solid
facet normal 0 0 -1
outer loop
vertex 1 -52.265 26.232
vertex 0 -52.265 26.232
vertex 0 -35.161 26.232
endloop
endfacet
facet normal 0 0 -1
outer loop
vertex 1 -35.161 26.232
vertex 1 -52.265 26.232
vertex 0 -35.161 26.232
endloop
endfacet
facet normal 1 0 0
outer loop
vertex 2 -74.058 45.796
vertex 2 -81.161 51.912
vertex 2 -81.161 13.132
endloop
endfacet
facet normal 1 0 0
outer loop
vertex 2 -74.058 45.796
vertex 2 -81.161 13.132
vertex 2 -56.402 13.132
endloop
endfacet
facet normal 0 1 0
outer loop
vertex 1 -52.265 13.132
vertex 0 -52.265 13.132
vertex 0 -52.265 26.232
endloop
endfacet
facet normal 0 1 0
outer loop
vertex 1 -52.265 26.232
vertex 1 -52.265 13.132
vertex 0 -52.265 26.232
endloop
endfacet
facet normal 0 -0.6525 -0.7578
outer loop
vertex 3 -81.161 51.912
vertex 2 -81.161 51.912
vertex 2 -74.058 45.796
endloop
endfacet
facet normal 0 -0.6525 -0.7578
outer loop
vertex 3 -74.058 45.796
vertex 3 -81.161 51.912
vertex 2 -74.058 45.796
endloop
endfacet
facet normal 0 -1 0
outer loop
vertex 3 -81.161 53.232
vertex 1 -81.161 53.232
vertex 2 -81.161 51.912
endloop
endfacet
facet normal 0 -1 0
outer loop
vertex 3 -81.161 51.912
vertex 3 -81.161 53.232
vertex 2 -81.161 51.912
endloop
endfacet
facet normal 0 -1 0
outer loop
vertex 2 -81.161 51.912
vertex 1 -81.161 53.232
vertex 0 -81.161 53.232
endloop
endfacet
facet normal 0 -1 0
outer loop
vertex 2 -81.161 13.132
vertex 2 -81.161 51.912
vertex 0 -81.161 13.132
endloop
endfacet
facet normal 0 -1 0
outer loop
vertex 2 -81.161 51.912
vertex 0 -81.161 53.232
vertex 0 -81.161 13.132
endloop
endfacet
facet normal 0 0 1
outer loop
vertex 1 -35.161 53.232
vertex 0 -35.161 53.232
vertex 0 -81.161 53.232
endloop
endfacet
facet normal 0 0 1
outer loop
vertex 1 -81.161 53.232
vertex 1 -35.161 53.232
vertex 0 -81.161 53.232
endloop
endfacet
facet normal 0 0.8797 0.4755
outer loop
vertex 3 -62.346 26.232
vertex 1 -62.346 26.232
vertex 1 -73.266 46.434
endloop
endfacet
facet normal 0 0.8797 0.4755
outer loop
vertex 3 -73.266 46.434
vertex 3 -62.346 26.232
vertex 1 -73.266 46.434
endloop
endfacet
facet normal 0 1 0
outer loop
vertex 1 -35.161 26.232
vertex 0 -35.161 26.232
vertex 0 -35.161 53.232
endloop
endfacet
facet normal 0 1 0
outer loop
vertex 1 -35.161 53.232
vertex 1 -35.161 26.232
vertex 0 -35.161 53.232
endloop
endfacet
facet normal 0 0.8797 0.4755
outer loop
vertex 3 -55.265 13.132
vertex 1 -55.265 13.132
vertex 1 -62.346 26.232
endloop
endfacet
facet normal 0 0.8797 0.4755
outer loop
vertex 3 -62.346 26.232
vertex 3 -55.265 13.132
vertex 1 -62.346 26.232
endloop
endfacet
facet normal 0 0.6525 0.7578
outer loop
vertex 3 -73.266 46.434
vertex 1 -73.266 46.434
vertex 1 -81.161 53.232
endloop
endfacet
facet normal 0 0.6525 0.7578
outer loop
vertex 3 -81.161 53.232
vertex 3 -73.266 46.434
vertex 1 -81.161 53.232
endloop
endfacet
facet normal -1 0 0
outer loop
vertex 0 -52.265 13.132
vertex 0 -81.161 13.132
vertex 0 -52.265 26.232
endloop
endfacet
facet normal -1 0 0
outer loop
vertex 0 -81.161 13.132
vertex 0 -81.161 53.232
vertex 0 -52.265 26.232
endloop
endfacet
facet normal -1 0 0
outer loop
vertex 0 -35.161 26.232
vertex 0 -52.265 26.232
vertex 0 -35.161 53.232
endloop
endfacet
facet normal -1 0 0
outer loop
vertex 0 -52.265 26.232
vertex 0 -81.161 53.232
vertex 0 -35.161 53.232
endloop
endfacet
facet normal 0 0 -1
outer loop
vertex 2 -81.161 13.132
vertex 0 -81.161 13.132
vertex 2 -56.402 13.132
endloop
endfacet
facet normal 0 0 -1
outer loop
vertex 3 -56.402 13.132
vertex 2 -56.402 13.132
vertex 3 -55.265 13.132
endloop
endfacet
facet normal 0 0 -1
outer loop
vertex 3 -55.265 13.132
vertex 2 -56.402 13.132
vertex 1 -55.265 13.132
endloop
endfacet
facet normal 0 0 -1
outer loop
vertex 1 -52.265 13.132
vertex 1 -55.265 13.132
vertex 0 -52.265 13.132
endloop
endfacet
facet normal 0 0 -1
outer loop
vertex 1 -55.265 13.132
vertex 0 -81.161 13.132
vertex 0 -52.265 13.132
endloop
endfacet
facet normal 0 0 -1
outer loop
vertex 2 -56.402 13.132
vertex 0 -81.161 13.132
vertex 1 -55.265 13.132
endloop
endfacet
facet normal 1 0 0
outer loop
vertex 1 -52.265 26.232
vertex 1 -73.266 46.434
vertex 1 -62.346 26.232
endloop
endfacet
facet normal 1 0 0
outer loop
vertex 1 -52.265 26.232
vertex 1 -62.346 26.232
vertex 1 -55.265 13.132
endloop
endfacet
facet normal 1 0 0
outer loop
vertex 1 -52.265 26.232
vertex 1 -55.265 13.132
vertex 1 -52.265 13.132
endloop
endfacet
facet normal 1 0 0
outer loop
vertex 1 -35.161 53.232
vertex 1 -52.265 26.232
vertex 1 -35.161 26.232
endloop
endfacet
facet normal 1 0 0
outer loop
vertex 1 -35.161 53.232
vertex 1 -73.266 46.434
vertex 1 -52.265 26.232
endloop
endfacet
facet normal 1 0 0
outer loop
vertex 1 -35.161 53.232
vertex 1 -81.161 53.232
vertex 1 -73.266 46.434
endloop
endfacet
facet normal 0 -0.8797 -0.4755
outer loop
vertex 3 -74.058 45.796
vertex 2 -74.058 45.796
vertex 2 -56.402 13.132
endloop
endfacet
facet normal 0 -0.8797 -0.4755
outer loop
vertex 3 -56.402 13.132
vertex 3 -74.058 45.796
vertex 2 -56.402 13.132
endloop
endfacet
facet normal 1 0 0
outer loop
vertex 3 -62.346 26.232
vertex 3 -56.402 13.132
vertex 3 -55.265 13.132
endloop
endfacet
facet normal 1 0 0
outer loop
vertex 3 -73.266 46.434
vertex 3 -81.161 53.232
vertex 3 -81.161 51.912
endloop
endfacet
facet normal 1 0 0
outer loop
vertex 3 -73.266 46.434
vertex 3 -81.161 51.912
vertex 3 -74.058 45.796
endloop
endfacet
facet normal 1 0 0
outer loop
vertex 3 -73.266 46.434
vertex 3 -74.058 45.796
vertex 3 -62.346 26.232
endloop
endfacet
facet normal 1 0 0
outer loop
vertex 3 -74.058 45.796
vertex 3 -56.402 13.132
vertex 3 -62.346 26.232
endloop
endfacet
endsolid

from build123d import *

# Parameters (mm, degrees)
F1_DEPTH = 1
F2_DEPTH = 3
F3_DEPTH = 2


with BuildPart() as f1:
    # F0 (on Right) → F1 (new body)
    with BuildSketch(Plane.YZ):
        Polygon((-35.161479, 26.232064), (-35.161479, 53.232064), (-81.161479, 53.232064), (-73.265584, 46.433675), (-62.346259, 26.232064), (-55.265479, 13.132064), (-52.265479, 13.132064), (-52.265479, 26.232064), (-45.161479, 26.232064), align=None)
    extrude(amount=F1_DEPTH)

    # F0 (on Right) → F2 (join)
    with BuildSketch(Plane.YZ):
        Polygon((-73.265584, 46.433675), (-81.161479, 53.232064), (-81.161479, 51.912471), (-74.057687, 45.796085), (-56.402211, 13.132064), (-55.265479, 13.132064), (-62.346259, 26.232064), align=None)
    extrude(amount=F2_DEPTH)

    # F0 (on Right) → F3 (join)
    with BuildSketch(Plane.YZ):
        Polygon((-74.057687, 45.796085), (-81.161479, 51.912471), (-81.161479, 26.232064), (-81.161479, 13.132064), (-56.402211, 13.132064), align=None)
    extrude(amount=F3_DEPTH)


solid = f1.part
